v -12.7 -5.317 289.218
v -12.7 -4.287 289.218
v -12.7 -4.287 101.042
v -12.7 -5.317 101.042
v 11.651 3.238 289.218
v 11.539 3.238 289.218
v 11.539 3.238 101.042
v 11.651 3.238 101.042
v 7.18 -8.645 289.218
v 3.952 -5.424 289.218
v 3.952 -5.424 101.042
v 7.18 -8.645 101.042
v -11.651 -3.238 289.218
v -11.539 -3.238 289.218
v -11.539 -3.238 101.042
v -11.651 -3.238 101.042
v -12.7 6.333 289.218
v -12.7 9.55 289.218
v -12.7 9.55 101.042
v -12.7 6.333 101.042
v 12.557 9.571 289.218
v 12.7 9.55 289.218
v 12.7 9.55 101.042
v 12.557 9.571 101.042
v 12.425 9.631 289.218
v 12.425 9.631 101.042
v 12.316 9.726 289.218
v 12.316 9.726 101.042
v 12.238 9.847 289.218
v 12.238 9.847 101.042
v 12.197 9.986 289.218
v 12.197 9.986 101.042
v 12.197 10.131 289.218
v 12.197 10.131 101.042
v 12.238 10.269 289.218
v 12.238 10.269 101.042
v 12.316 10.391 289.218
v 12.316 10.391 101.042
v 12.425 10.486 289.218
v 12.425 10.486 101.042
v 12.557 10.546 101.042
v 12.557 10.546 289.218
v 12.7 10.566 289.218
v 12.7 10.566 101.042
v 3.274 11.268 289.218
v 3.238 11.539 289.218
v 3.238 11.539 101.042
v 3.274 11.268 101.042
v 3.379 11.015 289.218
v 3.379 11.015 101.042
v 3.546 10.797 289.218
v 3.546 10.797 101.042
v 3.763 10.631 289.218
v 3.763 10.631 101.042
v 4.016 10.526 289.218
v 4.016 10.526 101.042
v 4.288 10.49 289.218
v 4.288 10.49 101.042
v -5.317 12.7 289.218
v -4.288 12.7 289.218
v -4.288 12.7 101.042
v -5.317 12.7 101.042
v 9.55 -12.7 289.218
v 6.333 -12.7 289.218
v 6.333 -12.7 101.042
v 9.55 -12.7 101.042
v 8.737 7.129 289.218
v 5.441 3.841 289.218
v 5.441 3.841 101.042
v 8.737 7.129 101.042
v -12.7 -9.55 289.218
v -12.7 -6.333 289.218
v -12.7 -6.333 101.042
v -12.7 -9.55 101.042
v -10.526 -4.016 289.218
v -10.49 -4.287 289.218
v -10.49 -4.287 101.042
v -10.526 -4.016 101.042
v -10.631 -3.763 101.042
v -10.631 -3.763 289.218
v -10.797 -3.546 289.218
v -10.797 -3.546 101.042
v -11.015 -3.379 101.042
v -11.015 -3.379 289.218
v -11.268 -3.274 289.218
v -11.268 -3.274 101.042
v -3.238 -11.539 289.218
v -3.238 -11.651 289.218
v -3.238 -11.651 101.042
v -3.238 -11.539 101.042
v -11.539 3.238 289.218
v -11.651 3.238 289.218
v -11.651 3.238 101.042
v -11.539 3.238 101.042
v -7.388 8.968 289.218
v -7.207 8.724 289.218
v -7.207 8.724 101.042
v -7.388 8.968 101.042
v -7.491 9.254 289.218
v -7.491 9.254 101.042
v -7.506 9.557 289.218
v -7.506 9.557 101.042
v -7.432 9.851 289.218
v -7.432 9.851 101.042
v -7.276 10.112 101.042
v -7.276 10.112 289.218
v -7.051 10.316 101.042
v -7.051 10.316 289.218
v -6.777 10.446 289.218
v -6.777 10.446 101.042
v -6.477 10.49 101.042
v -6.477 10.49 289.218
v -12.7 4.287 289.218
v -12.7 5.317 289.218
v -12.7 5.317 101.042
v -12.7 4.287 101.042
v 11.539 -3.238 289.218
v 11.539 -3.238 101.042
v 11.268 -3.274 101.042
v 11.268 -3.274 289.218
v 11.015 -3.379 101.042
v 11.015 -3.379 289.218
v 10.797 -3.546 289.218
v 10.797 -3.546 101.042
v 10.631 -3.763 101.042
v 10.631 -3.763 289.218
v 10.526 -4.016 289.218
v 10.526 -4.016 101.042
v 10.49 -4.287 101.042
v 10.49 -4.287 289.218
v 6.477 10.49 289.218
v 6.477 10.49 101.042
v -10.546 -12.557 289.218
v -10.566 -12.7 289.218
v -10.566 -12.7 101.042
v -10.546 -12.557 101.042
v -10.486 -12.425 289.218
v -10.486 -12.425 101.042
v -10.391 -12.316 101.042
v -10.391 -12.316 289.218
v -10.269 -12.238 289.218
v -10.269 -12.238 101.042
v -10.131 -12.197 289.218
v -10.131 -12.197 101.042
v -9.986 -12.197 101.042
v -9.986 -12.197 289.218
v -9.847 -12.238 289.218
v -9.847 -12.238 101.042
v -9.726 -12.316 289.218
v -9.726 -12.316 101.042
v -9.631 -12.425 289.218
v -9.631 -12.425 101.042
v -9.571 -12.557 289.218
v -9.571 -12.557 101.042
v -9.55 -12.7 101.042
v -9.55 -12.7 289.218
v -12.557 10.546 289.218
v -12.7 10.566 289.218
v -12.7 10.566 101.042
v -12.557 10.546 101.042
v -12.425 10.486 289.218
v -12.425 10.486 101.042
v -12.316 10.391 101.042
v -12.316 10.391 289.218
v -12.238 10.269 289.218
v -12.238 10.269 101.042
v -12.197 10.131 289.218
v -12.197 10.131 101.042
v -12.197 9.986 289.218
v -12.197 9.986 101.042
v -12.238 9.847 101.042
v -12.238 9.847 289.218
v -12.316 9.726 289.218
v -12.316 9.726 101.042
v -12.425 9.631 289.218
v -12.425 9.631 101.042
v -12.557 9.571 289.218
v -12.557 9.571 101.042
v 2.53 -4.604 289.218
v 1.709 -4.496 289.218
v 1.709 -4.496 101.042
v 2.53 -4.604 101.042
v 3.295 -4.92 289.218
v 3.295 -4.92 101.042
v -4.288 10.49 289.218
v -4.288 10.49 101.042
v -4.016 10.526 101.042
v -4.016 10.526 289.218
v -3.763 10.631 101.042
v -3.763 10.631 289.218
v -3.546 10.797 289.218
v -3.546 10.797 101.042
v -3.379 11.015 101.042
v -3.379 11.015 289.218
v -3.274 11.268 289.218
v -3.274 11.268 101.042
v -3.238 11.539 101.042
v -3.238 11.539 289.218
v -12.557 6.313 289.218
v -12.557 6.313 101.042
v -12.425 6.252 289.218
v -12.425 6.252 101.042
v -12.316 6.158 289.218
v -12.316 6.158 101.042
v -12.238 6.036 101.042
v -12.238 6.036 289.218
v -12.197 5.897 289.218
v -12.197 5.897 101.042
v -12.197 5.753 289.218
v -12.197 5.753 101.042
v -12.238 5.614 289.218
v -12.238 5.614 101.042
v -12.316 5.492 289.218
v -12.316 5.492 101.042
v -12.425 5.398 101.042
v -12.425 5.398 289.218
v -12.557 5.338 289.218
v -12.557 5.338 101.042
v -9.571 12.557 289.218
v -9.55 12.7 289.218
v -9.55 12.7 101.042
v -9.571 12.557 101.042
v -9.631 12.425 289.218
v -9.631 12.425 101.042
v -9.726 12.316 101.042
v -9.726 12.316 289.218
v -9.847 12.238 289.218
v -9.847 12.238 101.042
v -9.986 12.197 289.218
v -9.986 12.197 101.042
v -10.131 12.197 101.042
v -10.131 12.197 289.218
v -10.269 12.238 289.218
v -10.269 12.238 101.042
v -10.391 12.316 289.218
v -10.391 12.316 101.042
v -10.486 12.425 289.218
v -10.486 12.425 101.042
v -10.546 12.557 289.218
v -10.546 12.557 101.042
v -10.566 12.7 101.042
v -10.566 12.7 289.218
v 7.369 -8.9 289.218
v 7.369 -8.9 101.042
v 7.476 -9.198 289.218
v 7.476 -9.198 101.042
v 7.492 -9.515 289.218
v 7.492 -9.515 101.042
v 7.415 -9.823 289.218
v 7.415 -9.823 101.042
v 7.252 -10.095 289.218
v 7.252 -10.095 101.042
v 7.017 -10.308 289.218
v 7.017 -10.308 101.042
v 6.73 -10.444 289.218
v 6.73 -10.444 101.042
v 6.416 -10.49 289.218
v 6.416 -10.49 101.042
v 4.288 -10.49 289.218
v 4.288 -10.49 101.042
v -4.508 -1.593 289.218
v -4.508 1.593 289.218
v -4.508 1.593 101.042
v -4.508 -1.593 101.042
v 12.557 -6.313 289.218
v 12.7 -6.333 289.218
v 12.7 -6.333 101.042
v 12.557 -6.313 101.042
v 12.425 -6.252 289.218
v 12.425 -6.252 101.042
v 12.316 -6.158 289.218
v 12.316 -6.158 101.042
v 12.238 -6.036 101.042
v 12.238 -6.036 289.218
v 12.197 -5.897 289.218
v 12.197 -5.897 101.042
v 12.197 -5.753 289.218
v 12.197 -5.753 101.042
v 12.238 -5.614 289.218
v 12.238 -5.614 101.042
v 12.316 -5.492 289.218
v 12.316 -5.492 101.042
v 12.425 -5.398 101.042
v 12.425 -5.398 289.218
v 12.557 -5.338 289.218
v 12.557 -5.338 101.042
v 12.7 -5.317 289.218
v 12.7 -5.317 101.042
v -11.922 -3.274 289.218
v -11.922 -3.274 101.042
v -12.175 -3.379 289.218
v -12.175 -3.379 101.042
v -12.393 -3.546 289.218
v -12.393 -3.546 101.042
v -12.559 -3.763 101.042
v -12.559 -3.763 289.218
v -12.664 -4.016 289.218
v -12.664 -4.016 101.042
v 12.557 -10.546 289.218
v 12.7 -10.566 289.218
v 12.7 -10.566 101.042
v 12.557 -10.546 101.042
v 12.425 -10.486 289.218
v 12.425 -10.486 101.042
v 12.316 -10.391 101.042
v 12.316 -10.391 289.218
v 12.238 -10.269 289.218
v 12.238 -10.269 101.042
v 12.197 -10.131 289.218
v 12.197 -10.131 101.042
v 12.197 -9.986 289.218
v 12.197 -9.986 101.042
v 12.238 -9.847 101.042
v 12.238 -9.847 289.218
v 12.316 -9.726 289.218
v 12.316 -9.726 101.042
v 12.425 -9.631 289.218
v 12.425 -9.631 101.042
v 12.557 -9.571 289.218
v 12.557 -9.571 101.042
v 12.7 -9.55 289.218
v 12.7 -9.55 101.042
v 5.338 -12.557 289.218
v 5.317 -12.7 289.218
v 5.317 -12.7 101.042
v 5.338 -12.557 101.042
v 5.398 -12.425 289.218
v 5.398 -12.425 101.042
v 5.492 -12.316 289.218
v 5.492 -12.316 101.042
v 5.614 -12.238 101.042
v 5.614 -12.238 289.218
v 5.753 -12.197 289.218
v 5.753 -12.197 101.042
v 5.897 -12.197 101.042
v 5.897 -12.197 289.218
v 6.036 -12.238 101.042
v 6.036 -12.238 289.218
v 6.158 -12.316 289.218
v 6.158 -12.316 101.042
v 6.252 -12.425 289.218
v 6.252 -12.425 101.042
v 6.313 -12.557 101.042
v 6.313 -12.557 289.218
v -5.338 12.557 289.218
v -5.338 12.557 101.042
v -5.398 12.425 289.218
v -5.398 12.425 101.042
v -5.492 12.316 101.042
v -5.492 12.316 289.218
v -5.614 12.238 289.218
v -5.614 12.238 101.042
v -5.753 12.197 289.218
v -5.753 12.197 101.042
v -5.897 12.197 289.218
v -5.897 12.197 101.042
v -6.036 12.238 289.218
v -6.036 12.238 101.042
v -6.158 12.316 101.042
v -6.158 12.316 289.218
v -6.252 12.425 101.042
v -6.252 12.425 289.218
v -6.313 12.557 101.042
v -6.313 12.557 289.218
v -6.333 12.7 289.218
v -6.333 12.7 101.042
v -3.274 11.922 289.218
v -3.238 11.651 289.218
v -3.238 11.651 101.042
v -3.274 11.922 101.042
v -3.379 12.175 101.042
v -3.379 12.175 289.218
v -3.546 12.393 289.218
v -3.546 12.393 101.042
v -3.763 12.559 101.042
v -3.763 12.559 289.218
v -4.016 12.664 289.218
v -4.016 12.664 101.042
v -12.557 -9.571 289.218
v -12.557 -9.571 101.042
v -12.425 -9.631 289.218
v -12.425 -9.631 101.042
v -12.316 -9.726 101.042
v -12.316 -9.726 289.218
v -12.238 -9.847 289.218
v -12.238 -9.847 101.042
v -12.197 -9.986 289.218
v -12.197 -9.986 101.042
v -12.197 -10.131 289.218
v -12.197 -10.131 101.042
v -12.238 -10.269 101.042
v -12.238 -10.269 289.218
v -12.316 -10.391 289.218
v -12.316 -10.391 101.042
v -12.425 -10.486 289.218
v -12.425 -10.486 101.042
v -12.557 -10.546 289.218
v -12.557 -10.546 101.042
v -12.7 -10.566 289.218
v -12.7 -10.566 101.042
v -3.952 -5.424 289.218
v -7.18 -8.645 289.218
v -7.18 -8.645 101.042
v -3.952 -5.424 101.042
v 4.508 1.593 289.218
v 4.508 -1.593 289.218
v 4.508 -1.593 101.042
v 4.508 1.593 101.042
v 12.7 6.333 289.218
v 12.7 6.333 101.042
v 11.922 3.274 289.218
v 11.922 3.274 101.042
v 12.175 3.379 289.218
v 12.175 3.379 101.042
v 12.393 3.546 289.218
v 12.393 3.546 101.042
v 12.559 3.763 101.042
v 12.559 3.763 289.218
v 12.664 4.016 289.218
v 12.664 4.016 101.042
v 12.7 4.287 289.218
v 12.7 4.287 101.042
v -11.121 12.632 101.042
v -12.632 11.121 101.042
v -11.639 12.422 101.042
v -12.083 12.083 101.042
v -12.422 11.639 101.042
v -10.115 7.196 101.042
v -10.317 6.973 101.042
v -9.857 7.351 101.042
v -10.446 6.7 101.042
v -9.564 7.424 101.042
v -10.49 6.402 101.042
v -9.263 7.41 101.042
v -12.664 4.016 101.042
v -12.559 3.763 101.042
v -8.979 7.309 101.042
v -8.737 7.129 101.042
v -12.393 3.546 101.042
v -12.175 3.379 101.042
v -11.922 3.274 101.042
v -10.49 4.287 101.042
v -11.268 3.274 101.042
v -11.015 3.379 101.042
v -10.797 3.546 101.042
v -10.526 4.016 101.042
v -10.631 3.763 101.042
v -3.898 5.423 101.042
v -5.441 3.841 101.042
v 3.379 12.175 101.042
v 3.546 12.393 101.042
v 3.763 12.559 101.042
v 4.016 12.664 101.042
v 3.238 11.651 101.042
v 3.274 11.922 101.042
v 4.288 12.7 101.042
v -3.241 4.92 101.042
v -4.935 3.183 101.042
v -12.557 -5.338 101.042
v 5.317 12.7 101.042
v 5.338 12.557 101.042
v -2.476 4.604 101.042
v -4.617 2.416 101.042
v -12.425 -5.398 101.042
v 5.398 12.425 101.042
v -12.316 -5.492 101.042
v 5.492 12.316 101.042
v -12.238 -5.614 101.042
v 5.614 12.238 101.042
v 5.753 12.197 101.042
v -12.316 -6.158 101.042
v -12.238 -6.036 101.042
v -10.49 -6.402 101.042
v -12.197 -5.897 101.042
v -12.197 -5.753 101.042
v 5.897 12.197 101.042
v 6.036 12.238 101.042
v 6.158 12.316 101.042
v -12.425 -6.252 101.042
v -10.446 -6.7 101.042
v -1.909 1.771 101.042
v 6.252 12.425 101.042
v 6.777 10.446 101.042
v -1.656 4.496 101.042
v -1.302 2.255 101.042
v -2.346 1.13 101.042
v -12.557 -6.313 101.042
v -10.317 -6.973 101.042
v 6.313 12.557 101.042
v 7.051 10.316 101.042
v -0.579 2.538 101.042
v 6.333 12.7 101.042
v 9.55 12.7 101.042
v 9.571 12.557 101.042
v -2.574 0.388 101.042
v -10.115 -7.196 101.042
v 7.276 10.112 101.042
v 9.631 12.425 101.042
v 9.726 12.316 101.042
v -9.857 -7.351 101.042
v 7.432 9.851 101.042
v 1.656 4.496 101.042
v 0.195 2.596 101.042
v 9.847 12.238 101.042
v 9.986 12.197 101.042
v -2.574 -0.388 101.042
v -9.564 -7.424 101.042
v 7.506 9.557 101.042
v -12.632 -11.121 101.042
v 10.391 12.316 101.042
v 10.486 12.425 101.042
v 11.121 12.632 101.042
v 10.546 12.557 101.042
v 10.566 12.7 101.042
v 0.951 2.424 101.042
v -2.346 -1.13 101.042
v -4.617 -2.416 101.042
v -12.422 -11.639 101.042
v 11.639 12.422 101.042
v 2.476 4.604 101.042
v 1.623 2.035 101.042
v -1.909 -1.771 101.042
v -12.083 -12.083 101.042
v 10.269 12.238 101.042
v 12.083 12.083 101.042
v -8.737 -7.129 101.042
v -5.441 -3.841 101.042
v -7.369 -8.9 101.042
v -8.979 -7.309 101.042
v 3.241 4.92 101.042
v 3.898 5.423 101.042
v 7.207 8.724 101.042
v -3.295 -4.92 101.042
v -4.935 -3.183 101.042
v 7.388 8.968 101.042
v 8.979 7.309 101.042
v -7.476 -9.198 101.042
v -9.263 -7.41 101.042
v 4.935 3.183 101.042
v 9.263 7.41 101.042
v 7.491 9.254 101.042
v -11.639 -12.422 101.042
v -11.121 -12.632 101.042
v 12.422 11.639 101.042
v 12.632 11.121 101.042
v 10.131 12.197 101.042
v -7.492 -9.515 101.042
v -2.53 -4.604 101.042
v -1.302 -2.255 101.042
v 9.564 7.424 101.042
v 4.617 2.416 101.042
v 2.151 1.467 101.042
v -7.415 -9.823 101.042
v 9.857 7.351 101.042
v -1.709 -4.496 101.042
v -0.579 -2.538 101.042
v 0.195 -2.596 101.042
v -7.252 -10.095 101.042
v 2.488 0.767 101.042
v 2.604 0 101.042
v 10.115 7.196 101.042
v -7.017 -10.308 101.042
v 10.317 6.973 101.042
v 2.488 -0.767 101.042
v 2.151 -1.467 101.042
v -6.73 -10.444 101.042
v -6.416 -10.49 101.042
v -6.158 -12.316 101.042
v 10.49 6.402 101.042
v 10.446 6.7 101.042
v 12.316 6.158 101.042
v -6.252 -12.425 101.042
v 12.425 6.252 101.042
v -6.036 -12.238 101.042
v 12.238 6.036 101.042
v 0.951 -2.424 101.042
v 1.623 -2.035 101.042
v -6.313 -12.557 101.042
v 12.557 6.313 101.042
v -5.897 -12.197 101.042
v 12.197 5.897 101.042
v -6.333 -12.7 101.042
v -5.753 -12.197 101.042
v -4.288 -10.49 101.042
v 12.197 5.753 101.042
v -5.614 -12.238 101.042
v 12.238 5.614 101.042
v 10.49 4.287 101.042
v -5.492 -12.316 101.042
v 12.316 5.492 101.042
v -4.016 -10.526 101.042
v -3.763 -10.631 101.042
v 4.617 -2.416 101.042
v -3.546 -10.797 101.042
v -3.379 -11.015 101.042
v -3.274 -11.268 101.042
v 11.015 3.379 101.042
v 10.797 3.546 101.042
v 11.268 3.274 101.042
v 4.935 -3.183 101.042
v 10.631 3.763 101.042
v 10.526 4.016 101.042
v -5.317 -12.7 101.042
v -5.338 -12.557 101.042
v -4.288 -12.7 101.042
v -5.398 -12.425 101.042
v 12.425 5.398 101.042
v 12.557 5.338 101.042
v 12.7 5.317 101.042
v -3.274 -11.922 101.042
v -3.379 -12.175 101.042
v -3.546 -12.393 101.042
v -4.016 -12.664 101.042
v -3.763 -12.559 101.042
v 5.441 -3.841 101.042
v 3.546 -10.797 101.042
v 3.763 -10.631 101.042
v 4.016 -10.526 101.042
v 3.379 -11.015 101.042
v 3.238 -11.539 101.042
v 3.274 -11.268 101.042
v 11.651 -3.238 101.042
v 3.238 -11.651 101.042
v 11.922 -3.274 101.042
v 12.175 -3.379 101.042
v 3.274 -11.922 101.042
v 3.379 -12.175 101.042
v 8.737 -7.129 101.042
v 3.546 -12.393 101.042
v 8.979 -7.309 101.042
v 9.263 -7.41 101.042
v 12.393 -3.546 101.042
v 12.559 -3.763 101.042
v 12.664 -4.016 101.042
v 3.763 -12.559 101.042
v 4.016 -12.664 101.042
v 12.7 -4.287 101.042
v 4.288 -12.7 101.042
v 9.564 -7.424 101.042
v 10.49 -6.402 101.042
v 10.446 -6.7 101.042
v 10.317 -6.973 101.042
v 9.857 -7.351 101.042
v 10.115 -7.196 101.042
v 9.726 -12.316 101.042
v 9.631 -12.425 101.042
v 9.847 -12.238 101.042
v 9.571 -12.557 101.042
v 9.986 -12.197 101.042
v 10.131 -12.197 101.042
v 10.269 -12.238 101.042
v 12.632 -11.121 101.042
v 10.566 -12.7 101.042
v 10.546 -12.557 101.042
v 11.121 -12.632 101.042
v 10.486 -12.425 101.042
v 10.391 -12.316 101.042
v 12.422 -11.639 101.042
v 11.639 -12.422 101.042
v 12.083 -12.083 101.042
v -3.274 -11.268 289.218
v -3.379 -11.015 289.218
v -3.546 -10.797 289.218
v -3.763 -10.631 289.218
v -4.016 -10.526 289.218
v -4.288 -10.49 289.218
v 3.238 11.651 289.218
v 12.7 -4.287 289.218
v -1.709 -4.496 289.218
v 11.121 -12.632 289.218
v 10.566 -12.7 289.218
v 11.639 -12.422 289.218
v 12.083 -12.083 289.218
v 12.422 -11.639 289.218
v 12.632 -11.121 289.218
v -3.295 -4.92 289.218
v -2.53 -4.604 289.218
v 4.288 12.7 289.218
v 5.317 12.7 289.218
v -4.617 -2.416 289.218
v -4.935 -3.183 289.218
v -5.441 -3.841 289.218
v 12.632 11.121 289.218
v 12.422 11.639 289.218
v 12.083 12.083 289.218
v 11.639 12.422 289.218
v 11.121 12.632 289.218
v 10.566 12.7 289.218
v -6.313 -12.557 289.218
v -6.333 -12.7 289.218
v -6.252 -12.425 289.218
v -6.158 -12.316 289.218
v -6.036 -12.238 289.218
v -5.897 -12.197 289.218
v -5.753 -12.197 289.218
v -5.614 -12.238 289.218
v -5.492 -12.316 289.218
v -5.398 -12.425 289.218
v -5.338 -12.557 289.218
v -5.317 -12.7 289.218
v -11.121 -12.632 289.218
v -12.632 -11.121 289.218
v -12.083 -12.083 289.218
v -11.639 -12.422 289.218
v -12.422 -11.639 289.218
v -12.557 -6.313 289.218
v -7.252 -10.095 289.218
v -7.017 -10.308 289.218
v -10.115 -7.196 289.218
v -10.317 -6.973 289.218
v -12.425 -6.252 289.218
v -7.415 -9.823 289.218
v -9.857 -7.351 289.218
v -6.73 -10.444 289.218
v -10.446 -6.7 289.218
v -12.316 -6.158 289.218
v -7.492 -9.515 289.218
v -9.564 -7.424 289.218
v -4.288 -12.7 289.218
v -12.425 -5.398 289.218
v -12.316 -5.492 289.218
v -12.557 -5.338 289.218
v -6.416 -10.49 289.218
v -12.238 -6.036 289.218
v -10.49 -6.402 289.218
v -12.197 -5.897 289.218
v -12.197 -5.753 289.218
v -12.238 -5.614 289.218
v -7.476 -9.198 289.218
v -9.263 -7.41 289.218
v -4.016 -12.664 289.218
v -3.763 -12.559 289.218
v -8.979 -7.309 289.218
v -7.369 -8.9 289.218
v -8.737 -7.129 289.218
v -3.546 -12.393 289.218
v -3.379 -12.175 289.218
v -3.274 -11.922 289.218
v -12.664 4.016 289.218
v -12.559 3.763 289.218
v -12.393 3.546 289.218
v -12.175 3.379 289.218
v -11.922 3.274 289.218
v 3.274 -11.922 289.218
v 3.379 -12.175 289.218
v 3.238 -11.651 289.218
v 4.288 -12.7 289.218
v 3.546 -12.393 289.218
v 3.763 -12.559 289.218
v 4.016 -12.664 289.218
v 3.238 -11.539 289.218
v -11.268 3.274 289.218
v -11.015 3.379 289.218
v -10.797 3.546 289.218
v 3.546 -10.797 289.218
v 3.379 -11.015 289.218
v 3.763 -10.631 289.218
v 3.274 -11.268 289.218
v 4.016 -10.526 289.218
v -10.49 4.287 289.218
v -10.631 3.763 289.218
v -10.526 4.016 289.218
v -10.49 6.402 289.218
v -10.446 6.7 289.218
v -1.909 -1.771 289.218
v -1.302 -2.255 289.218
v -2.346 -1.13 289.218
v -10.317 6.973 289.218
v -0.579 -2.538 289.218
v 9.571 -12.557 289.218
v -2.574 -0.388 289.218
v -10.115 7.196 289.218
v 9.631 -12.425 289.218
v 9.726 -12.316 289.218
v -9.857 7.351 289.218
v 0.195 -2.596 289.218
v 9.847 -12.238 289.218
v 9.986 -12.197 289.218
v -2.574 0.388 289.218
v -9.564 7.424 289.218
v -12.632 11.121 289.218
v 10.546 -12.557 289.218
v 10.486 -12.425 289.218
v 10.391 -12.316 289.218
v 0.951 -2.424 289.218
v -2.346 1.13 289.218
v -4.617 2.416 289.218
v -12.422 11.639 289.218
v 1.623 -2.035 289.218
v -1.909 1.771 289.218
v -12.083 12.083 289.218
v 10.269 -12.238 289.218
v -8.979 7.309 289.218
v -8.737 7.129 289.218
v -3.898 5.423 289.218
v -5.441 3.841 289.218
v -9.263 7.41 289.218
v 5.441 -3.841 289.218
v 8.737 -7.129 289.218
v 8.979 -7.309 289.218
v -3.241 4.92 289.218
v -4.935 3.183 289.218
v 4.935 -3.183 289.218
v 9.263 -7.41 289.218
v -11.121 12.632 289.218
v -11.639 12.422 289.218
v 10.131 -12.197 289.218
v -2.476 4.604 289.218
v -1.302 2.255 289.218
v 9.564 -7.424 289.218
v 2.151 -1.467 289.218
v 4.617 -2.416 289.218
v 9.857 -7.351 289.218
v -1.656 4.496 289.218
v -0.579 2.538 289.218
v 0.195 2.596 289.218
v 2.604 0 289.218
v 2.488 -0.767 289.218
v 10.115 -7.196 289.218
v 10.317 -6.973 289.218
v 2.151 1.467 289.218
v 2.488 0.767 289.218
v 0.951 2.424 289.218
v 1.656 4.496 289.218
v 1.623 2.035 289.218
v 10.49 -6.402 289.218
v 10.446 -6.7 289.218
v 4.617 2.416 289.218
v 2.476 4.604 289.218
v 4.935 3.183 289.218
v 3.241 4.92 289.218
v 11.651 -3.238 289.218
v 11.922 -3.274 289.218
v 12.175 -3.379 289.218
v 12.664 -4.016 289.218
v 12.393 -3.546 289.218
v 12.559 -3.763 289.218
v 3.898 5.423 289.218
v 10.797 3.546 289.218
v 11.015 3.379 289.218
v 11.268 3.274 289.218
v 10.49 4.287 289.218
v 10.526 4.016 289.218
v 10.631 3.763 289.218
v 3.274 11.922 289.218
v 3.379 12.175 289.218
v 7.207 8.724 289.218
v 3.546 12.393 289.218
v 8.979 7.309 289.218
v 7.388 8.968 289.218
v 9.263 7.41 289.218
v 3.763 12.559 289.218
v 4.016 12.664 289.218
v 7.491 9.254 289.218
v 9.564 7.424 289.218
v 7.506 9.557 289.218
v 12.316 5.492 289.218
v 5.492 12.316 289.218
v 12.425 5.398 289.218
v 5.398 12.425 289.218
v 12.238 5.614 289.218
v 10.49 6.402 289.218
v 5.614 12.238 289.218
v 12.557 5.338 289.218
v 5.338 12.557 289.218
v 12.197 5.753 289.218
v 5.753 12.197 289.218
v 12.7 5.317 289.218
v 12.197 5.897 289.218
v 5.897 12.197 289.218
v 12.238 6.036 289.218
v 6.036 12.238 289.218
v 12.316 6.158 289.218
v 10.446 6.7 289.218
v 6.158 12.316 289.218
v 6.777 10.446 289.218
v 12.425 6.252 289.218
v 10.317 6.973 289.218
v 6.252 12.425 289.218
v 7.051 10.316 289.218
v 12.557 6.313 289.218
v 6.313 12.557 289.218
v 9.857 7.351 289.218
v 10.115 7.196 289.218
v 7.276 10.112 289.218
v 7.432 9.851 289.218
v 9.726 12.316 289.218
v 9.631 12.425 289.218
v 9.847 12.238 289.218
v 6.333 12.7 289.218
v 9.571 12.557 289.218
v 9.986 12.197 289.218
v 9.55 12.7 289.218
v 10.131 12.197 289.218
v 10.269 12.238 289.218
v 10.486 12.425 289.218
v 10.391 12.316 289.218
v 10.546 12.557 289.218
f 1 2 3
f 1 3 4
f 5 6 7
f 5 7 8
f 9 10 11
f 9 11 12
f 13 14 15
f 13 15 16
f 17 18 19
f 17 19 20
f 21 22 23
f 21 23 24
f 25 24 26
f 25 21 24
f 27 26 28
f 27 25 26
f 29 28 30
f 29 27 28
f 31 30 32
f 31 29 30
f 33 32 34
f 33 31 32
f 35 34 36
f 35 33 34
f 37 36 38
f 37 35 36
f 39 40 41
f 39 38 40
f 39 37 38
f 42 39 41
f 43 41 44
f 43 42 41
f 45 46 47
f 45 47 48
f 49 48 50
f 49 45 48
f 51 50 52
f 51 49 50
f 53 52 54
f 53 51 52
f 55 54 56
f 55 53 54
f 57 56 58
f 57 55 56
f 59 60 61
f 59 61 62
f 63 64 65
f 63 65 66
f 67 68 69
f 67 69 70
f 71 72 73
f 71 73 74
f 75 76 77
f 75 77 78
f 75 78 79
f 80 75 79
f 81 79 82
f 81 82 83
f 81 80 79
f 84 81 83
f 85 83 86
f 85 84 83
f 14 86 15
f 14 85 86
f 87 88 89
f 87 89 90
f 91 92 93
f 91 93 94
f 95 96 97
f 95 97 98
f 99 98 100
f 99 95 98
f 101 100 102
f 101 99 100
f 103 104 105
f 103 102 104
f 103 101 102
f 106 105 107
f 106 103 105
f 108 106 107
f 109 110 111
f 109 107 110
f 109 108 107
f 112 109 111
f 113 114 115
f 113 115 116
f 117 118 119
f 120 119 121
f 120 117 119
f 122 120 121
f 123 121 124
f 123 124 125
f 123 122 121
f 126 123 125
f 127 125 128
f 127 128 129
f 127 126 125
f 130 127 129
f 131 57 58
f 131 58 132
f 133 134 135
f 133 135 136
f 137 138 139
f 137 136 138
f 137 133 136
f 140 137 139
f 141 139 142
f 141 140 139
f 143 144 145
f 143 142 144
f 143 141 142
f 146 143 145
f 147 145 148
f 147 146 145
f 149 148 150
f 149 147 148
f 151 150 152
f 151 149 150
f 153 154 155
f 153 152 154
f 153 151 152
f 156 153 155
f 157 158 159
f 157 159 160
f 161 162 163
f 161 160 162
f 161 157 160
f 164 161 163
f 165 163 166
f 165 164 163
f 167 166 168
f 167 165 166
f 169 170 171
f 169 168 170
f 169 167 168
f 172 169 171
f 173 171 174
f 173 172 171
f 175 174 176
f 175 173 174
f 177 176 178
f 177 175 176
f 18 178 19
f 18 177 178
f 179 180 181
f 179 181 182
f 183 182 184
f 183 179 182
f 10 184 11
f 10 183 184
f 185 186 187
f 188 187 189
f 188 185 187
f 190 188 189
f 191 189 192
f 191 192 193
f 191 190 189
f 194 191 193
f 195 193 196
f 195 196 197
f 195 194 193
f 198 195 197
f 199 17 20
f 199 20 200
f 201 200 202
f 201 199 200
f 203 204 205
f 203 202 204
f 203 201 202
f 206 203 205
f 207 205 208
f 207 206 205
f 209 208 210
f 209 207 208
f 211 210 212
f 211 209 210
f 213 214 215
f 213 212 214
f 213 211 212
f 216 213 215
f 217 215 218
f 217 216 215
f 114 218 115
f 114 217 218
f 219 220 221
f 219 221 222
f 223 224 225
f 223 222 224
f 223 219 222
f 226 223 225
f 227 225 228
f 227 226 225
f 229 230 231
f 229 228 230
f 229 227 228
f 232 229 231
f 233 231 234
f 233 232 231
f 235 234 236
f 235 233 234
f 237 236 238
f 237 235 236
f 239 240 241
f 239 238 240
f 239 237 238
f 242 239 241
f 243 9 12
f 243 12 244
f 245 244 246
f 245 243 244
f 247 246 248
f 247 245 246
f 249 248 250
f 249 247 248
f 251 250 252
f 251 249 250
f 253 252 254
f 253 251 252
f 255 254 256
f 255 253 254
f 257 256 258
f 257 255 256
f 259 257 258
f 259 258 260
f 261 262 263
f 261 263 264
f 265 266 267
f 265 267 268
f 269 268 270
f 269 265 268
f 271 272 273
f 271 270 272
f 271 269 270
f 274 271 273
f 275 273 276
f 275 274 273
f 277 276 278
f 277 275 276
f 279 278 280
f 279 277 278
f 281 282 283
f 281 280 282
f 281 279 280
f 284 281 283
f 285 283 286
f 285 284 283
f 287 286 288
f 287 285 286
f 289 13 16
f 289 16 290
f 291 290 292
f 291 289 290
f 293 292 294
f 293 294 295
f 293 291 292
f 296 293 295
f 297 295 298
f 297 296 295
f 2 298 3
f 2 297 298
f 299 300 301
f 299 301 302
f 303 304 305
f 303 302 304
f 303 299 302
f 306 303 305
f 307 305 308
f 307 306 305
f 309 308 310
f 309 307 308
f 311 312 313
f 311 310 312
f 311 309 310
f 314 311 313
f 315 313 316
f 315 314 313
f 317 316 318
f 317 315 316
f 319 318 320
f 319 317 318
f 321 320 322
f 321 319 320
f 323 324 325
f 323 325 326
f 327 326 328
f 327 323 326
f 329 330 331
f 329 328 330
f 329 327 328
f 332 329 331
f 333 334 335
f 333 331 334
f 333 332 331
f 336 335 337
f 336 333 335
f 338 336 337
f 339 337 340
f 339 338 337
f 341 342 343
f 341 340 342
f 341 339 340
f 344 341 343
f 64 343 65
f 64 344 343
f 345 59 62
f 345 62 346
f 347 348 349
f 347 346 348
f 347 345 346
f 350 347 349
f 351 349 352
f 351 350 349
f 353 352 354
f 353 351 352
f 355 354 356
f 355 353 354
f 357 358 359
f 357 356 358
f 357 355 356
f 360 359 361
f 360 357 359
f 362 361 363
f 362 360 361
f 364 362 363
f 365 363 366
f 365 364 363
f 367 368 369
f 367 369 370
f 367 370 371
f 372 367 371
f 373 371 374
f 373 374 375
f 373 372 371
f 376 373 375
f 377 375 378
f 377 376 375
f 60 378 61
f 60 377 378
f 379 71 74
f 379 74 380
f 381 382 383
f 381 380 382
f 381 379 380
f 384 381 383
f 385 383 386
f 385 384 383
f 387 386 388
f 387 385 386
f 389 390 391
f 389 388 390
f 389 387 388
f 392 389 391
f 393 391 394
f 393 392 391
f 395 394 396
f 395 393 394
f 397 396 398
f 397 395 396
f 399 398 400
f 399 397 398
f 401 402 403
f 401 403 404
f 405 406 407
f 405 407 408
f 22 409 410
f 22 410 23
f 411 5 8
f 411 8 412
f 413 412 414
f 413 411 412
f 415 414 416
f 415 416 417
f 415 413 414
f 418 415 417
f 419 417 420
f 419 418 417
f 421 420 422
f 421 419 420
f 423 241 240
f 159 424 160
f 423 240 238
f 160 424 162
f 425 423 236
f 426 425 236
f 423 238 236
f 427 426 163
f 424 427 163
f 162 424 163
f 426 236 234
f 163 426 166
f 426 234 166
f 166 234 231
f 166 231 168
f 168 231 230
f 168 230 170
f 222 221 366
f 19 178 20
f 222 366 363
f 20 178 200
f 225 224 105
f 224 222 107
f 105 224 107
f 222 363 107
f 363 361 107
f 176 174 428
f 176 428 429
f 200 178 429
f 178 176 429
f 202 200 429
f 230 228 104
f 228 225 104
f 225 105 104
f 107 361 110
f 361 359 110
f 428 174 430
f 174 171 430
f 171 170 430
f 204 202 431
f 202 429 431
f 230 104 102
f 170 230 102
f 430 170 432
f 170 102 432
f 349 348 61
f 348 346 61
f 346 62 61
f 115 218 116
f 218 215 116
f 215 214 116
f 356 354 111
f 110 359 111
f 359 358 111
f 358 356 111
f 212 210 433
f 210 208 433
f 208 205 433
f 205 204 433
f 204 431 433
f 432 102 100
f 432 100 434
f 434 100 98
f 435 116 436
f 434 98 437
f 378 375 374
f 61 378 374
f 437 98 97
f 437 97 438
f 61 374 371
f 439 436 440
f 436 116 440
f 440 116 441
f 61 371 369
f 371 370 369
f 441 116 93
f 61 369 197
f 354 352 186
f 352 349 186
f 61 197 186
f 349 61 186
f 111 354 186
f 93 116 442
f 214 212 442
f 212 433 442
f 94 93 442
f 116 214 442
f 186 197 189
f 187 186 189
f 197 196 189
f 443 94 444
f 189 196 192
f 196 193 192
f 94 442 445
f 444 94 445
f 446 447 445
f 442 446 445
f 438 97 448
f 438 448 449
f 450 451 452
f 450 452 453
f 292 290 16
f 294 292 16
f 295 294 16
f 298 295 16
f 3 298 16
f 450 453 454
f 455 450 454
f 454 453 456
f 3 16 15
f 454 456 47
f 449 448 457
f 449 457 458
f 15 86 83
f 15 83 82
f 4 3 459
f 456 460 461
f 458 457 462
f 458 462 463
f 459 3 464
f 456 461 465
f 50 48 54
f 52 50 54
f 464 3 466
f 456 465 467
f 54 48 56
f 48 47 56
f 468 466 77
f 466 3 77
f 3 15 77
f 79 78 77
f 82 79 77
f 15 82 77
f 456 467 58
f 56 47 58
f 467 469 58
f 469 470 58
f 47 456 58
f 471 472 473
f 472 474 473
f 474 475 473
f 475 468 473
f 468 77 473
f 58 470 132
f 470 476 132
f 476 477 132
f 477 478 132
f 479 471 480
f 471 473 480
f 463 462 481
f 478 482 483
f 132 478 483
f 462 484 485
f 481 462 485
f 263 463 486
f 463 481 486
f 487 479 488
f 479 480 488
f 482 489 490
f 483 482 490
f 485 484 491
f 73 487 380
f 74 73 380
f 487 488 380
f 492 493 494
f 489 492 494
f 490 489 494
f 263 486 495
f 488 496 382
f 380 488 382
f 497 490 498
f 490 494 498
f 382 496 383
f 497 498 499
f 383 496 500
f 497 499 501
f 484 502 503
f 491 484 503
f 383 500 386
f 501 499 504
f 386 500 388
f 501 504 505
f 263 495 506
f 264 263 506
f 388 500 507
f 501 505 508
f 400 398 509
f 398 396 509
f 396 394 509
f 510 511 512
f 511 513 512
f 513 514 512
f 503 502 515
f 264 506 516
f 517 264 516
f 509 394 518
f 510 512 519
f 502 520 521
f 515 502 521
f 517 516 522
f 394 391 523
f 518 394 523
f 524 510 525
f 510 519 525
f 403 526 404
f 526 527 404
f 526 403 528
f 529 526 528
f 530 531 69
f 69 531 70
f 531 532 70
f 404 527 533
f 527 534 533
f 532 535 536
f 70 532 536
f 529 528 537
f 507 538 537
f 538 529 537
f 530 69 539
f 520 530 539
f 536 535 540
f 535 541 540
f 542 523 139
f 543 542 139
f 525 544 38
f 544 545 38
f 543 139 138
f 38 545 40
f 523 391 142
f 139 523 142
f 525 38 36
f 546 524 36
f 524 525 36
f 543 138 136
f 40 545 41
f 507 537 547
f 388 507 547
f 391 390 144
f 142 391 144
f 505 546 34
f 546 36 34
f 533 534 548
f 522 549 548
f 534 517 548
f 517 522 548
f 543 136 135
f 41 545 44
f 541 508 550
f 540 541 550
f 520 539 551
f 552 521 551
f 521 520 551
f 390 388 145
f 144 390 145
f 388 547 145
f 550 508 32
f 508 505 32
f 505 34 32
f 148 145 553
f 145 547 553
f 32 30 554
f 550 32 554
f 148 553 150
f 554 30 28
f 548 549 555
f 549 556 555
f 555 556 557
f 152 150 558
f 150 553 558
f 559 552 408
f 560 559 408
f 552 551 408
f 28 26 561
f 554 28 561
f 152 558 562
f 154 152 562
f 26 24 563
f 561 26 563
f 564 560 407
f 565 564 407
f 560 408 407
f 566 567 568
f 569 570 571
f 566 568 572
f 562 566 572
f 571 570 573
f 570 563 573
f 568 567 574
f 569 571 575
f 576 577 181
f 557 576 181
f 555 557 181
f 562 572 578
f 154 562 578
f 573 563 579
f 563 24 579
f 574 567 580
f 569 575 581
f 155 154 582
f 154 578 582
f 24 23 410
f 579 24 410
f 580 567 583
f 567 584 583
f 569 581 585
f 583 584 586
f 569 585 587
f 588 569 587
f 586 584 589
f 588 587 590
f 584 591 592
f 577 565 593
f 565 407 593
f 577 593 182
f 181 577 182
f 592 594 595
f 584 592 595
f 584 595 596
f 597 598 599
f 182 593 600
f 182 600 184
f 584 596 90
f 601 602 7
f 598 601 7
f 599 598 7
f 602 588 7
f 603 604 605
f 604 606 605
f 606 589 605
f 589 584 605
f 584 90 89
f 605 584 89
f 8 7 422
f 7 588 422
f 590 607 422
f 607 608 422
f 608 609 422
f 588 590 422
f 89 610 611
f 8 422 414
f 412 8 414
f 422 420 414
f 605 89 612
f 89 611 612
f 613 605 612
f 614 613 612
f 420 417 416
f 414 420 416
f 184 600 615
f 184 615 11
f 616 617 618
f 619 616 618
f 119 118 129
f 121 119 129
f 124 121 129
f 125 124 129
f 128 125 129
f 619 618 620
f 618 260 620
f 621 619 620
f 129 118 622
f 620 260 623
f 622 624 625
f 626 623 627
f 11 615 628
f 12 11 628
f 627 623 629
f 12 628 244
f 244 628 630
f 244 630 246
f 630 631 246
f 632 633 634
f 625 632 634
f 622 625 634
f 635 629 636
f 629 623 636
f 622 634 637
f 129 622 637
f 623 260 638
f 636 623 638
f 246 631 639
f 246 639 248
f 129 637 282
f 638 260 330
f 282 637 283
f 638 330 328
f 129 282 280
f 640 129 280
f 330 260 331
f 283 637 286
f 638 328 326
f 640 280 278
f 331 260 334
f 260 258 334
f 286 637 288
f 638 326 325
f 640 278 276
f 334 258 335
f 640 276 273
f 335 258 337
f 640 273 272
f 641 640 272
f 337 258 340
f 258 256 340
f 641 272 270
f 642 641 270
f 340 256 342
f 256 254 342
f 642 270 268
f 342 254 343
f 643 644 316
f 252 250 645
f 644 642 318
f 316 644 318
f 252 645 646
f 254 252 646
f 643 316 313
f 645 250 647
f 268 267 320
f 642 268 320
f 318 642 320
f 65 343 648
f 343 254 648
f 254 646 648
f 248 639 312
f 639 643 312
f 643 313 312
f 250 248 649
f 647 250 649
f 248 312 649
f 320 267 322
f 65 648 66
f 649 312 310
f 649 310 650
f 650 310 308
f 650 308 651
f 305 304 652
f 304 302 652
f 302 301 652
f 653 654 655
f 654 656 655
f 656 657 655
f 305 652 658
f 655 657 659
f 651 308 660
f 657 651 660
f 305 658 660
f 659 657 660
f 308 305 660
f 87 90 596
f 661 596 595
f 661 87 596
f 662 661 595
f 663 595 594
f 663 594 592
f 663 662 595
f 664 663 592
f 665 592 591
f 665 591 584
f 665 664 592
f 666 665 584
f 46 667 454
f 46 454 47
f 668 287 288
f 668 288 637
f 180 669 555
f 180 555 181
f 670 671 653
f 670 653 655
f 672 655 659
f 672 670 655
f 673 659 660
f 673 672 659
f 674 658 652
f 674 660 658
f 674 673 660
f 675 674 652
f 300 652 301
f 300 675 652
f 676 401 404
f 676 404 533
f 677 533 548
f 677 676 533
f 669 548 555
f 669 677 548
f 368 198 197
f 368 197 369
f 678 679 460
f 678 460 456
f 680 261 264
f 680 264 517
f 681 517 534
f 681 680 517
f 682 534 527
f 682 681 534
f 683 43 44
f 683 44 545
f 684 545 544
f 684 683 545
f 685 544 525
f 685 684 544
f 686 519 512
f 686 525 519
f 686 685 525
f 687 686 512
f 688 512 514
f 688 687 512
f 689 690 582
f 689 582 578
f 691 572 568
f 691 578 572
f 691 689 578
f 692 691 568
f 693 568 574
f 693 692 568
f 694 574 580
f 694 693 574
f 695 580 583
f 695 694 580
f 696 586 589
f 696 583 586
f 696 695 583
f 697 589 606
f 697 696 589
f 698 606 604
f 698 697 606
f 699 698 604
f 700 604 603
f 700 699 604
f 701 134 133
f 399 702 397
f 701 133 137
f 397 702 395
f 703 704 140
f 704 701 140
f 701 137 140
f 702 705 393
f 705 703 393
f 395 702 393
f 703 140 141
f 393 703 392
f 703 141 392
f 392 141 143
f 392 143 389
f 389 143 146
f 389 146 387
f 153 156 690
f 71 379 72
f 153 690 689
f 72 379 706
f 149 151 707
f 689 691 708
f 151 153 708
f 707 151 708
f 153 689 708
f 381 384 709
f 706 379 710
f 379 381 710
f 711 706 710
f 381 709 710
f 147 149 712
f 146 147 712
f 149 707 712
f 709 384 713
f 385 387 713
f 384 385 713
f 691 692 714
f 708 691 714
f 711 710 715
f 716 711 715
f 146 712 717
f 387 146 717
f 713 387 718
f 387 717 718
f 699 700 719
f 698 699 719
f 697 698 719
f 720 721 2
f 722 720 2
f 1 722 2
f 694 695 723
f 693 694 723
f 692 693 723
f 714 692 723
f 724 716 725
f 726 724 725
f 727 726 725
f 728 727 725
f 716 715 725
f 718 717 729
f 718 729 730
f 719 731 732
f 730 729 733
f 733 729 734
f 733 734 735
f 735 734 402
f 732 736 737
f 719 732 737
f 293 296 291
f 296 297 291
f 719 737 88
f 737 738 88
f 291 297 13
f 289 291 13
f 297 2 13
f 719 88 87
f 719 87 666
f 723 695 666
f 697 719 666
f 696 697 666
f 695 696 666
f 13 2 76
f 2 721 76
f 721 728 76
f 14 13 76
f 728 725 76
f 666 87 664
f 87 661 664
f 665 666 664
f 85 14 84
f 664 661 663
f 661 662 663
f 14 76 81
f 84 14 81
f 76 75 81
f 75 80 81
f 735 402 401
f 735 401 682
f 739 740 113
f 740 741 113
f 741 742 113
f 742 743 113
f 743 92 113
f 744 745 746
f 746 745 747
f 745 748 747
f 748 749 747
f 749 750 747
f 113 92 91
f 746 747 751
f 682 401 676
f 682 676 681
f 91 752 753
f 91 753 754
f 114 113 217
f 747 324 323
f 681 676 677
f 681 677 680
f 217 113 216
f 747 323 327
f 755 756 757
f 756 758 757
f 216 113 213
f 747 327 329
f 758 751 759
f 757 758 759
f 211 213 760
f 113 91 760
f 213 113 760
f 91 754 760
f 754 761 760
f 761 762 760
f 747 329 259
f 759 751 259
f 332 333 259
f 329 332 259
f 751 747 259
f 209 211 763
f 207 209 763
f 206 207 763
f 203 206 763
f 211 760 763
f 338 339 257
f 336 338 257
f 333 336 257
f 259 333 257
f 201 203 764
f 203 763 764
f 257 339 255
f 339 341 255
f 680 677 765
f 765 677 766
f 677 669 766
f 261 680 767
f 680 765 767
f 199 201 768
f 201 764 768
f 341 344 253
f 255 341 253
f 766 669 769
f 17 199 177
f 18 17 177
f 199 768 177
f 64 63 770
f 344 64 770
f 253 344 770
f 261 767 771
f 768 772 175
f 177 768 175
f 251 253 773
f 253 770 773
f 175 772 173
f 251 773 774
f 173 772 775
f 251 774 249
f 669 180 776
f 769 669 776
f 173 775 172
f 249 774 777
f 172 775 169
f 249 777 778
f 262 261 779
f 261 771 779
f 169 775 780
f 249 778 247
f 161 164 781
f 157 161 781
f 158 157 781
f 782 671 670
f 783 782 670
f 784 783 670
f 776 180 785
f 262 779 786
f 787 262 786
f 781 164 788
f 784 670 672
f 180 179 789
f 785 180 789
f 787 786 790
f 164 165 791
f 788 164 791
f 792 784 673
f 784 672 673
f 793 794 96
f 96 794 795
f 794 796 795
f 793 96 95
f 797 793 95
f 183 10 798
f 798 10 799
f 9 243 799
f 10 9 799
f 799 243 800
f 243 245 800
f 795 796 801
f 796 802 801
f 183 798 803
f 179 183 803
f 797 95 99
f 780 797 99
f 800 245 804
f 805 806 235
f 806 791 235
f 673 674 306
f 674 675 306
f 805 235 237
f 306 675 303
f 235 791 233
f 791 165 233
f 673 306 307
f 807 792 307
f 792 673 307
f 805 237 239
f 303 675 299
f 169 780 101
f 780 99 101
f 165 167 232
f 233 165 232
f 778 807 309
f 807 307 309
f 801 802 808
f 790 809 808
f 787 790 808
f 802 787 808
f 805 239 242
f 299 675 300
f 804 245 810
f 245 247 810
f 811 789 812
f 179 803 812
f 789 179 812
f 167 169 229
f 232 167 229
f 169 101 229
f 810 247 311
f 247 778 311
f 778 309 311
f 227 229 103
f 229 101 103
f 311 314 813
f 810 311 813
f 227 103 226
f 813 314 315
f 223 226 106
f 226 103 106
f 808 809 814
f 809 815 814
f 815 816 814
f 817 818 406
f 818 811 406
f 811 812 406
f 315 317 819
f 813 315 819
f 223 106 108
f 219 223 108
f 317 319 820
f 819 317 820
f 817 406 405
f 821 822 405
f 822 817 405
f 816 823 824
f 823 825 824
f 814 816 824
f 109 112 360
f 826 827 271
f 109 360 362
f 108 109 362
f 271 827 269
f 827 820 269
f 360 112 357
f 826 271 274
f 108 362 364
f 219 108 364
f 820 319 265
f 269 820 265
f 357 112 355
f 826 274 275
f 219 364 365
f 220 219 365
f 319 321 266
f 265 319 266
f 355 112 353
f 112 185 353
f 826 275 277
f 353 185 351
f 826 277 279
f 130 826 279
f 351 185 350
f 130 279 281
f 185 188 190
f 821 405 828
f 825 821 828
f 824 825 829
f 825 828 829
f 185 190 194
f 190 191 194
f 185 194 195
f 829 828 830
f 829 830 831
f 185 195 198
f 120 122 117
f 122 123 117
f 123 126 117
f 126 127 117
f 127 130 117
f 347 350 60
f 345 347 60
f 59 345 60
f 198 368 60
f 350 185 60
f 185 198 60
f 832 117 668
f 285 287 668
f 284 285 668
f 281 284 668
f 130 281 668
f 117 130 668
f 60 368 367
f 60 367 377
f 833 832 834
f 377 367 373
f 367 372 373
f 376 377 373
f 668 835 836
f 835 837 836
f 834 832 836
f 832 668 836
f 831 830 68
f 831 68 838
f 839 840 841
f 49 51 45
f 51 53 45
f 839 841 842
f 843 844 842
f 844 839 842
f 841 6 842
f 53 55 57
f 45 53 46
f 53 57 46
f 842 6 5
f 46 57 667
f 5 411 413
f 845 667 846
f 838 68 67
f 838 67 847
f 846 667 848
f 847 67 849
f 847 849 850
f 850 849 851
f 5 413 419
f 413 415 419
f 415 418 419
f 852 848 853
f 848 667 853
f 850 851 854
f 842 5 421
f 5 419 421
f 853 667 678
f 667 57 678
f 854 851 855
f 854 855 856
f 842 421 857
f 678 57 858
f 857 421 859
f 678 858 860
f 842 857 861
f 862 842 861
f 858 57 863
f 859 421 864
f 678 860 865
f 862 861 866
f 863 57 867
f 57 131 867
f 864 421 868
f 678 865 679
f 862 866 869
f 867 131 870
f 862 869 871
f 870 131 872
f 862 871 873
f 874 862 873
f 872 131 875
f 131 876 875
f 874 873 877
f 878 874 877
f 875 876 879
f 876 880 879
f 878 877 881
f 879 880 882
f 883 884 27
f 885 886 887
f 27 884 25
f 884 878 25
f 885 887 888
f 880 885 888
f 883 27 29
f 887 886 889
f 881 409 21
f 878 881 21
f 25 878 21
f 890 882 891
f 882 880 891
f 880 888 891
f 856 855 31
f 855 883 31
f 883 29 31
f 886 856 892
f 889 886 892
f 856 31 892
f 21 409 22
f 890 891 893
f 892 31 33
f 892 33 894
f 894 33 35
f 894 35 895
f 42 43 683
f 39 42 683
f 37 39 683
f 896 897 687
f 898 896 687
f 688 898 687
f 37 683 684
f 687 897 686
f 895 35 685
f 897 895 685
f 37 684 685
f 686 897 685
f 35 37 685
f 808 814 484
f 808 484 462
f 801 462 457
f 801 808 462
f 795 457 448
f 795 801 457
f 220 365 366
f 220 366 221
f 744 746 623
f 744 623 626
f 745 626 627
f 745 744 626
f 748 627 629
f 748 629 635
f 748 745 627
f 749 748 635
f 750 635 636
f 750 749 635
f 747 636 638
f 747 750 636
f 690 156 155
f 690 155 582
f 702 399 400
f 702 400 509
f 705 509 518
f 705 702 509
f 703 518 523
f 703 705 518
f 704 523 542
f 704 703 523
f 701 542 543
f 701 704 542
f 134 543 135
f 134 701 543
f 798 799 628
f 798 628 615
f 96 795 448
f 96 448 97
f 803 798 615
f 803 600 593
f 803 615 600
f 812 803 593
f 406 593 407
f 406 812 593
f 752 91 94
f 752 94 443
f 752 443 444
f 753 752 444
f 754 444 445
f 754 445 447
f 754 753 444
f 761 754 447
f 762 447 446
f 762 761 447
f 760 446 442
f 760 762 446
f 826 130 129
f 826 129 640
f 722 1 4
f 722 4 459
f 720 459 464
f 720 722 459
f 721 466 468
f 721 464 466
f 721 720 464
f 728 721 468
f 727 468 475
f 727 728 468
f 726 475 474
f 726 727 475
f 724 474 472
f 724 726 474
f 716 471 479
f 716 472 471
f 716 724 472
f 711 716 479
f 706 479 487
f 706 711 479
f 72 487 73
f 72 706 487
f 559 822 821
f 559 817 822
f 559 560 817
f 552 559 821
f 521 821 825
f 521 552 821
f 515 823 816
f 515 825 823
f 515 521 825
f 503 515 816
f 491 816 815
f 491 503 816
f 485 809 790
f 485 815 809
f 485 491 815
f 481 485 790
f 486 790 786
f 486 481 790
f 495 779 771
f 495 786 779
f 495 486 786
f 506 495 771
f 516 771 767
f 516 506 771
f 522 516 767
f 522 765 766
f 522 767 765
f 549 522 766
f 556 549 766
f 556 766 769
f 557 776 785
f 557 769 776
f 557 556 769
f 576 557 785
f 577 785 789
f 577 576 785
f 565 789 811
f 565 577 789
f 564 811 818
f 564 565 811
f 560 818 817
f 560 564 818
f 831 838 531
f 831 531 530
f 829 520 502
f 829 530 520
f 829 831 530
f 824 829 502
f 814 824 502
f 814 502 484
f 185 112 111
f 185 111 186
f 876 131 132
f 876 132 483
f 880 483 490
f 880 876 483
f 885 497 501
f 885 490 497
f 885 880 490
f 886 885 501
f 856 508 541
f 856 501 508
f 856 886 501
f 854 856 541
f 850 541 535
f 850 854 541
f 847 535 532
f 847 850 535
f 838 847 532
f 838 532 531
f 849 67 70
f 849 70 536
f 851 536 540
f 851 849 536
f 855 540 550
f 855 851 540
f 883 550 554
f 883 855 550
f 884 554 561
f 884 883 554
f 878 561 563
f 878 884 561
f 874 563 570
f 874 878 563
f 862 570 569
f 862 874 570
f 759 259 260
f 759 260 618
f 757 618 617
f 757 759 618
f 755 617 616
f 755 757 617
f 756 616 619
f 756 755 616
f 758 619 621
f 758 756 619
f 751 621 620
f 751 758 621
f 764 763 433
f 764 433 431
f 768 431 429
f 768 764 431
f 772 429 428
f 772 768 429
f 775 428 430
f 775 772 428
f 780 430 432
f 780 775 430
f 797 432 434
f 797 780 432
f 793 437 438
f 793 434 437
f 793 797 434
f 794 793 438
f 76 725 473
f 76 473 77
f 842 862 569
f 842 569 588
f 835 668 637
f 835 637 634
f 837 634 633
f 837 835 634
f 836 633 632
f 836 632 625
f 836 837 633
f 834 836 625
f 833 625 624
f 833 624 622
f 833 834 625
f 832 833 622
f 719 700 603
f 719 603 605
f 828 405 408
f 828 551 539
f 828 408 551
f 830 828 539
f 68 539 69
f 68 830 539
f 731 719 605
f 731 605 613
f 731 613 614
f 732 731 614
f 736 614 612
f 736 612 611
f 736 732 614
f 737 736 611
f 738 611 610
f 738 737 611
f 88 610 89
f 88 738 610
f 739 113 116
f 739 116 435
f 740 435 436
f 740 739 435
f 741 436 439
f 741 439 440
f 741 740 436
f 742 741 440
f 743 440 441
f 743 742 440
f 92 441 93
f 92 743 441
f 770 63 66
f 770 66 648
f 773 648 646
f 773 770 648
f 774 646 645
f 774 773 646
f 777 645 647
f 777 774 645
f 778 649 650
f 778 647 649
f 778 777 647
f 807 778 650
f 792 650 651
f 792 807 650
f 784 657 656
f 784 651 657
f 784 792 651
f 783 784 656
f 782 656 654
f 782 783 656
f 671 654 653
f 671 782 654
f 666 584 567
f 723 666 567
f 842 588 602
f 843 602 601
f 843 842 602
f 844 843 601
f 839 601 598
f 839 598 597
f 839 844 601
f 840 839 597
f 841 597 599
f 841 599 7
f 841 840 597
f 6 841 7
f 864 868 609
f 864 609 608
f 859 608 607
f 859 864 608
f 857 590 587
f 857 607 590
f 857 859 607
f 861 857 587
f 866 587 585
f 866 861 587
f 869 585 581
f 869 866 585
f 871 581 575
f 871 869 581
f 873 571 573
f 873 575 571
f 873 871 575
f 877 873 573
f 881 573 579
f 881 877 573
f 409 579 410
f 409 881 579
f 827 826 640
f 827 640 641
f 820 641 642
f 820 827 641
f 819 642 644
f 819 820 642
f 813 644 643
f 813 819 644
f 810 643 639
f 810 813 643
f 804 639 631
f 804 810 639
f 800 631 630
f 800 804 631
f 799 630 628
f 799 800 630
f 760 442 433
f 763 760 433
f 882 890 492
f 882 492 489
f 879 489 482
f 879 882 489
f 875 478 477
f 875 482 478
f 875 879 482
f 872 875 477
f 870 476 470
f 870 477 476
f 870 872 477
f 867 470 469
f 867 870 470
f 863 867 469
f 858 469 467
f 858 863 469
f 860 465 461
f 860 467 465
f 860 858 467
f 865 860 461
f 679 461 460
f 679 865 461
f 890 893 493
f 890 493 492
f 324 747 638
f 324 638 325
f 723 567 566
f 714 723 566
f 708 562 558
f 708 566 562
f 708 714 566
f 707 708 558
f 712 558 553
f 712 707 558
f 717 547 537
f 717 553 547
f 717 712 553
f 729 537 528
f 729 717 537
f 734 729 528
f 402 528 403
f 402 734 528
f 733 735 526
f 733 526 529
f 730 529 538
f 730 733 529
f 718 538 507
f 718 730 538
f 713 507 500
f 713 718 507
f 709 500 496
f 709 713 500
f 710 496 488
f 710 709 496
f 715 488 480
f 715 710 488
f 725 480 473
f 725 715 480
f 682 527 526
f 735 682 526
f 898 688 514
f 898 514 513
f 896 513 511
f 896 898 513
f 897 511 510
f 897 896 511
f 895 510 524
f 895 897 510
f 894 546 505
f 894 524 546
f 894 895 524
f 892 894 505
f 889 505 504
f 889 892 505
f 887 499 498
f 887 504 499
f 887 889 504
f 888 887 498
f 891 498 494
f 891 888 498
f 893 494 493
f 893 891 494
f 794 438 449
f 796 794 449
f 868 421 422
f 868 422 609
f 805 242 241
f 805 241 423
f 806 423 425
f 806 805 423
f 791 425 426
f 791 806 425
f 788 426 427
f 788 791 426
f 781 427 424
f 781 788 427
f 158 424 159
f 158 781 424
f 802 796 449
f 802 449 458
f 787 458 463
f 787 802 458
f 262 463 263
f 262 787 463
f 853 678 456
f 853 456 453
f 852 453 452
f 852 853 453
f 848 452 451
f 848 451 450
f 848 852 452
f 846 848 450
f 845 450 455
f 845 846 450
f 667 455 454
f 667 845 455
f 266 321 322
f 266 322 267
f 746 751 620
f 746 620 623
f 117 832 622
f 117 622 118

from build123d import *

# Parameters (mm, degrees)
SKETCH1_R               = 2.6035
BOSS_EXTRUDE1_DEPTH     = 304.8
SKETCH2_W               = 16.257599062
SKETCH2_H               = 27.586789262
CUT_EXTRUDE1_DEPTH      = 1.778
CUT_EXTRUDE1_DEPTH_BACK = 26.162


with BuildPart() as part:
    # Sketch1 → Boss-Extrude1 (new body, symmetric)
    with BuildSketch(Plane.XY):
        with BuildLine():
            Line((-7.179650497, -8.645192506), (-3.952270251, -5.423690499))
            ThreePointArc((-3.952270251, -5.423690499), (-2.922936451, -4.736929036), (-1.709253557, -4.4958))
            Line((-1.709253557, -4.4958), (1.709253557, -4.4958))
            ThreePointArc((1.709253557, -4.4958), (2.922936451, -4.736929036), (3.952270251, -5.423690499))
            Line((3.952270251, -5.423690499), (7.179650497, -8.645192506))
            ThreePointArc((7.179650497, -8.645192506), (7.41473083, -9.822813117), (6.416408329, -10.4902))
            Line((6.416408329, -10.4902), (4.287512407, -10.4902))
            ThreePointArc((4.287512407, -10.4902), (3.54574862, -10.79744862), (3.2385, -11.539212407))
            Line((3.2385, -11.539212407), (3.2385, -11.650987593))
            ThreePointArc((3.2385, -11.650987593), (3.54574862, -12.39275138), (4.287512407, -12.7))
            Line((4.287512407, -12.7), (5.317126718, -12.7))
            ThreePointArc((5.317126718, -12.7), (5.825126718, -12.192), (6.333126718, -12.7))
            Line((6.333126718, -12.7), (9.550443118, -12.7))
            ThreePointArc((9.550443118, -12.7), (10.058366869, -12.192000006), (10.566443095, -12.699847501))
            ThreePointArc((10.566443095, -12.699847501), (12.082537762, -12.08250727), (12.699846982, -10.566399977))
            ThreePointArc((12.699846982, -10.566399977), (12.192000006, -10.058323491), (12.7, -9.5504))
            Line((12.7, -9.5504), (12.7, -6.3330836))
            ThreePointArc((12.7, -6.3330836), (12.192, -5.8250836), (12.7, -5.3170836))
            Line((12.7, -5.3170836), (12.7, -4.287469289))
            ThreePointArc((12.7, -4.287469289), (12.39275138, -3.545705502), (11.650987593, -3.238456882))
            Line((11.650987593, -3.238456882), (11.539212407, -3.238456882))
            ThreePointArc((11.539212407, -3.238456882), (10.79744862, -3.545705502), (10.4902, -4.287469289))
            Line((10.4902, -4.287469289), (10.4902, -6.402089023))
            ThreePointArc((10.4902, -6.402089023), (9.856505071, -7.351067942), (8.737131347, -7.129408934))
            Line((8.737131347, -7.129408934), (5.441005833, -3.840816462))
            ThreePointArc((5.441005833, -3.840816462), (4.750877967, -2.809883091), (4.5085, -1.593185507))
            Line((4.5085, -1.593185507), (4.5085, 1.593185507))
            ThreePointArc((4.5085, 1.593185507), (4.750877967, 2.809883091), (5.441005833, 3.840816462))
            Line((5.441005833, 3.840816462), (8.737131347, 7.129408934))
            ThreePointArc((8.737131347, 7.129408934), (9.856505071, 7.351067942), (10.4902, 6.402089023))
            Line((10.4902, 6.402089023), (10.4902, 4.287469289))
            ThreePointArc((10.4902, 4.287469289), (10.79744862, 3.545705502), (11.539212407, 3.238456882))
            Line((11.539212407, 3.238456882), (11.650987593, 3.238456882))
            ThreePointArc((11.650987593, 3.238456882), (12.39275138, 3.545705502), (12.7, 4.287469289))
            Line((12.7, 4.287469289), (12.7, 5.3170836))
            ThreePointArc((12.7, 5.3170836), (12.192, 5.8250836), (12.7, 6.3330836))
            Line((12.7, 6.3330836), (12.7, 9.5504))
            ThreePointArc((12.7, 9.5504), (12.192000006, 10.058323491), (12.699846982, 10.566399977))
            ThreePointArc((12.699846982, 10.566399977), (12.082537762, 12.08250727), (10.566443095, 12.699847501))
            ThreePointArc((10.566443095, 12.699847501), (10.058366869, 12.192000006), (9.550443118, 12.7))
            Line((9.550443118, 12.7), (6.333126718, 12.7))
            ThreePointArc((6.333126718, 12.7), (5.825126718, 12.192), (5.317126718, 12.7))
            Line((5.317126718, 12.7), (4.287512407, 12.7))
            ThreePointArc((4.287512407, 12.7), (3.54574862, 12.39275138), (3.2385, 11.650987593))
            Line((3.2385, 11.650987593), (3.2385, 11.539212407))
            ThreePointArc((3.2385, 11.539212407), (3.54574862, 10.79744862), (4.287512407, 10.4902))
            Line((4.287512407, 10.4902), (6.476788598, 10.4902))
            ThreePointArc((6.476788598, 10.4902), (7.432222385, 9.85140422), (7.207036008, 8.724370562))
            Line((7.207036008, 8.724370562), (3.898272566, 5.423169045))
            ThreePointArc((3.898272566, 5.423169045), (2.869120213, 4.736787962), (1.655778399, 4.4958))
            Line((1.655778399, 4.4958), (-1.655778399, 4.4958))
            ThreePointArc((-1.655778399, 4.4958), (-2.869120213, 4.736787962), (-3.898272566, 5.423169045))
            Line((-3.898272566, 5.423169045), (-7.207036008, 8.724370562))
            ThreePointArc((-7.207036008, 8.724370562), (-7.432222385, 9.85140422), (-6.476788598, 10.4902))
            Line((-6.476788598, 10.4902), (-4.287512407, 10.4902))
            ThreePointArc((-4.287512407, 10.4902), (-3.54574862, 10.79744862), (-3.2385, 11.539212407))
            Line((-3.2385, 11.539212407), (-3.2385, 11.650987593))
            ThreePointArc((-3.2385, 11.650987593), (-3.54574862, 12.39275138), (-4.287512407, 12.7))
            Line((-4.287512407, 12.7), (-5.317126718, 12.7))
            ThreePointArc((-5.317126718, 12.7), (-5.825126718, 12.192), (-6.333126718, 12.7))
            Line((-6.333126718, 12.7), (-9.550443118, 12.7))
            ThreePointArc((-9.550443118, 12.7), (-10.058366869, 12.192000006), (-10.566443095, 12.699847501))
            ThreePointArc((-10.566443095, 12.699847501), (-12.082537762, 12.08250727), (-12.699846982, 10.566399977))
            ThreePointArc((-12.699846982, 10.566399977), (-12.192000006, 10.058323491), (-12.7, 9.5504))
            Line((-12.7, 9.5504), (-12.7, 6.3330836))
            ThreePointArc((-12.7, 6.3330836), (-12.192, 5.8250836), (-12.7, 5.3170836))
            Line((-12.7, 5.3170836), (-12.7, 4.287469289))
            ThreePointArc((-12.7, 4.287469289), (-12.39275138, 3.545705502), (-11.650987593, 3.238456882))
            Line((-11.650987593, 3.238456882), (-11.539212407, 3.238456882))
            ThreePointArc((-11.539212407, 3.238456882), (-10.79744862, 3.545705502), (-10.4902, 4.287469289))
            Line((-10.4902, 4.287469289), (-10.4902, 6.402089023))
            ThreePointArc((-10.4902, 6.402089023), (-9.856505071, 7.351067942), (-8.737131347, 7.129408934))
            Line((-8.737131347, 7.129408934), (-5.441005833, 3.840816462))
            ThreePointArc((-5.441005833, 3.840816462), (-4.750877967, 2.809883091), (-4.5085, 1.593185507))
            Line((-4.5085, 1.593185507), (-4.5085, -1.593185507))
            ThreePointArc((-4.5085, -1.593185507), (-4.750877967, -2.809883091), (-5.441005833, -3.840816462))
            Line((-5.441005833, -3.840816462), (-8.737131347, -7.129408934))
            ThreePointArc((-8.737131347, -7.129408934), (-9.856505071, -7.351067942), (-10.4902, -6.402089023))
            Line((-10.4902, -6.402089023), (-10.4902, -4.287469289))
            ThreePointArc((-10.4902, -4.287469289), (-10.79744862, -3.545705502), (-11.539212407, -3.238456882))
            Line((-11.539212407, -3.238456882), (-11.650987593, -3.238456882))
            ThreePointArc((-11.650987593, -3.238456882), (-12.39275138, -3.545705502), (-12.7, -4.287469289))
            Line((-12.7, -4.287469289), (-12.7, -5.3170836))
            ThreePointArc((-12.7, -5.3170836), (-12.192, -5.8250836), (-12.7, -6.3330836))
            Line((-12.7, -6.3330836), (-12.7, -9.5504))
            ThreePointArc((-12.7, -9.5504), (-12.192000006, -10.058323491), (-12.699846982, -10.566399977))
            ThreePointArc((-12.699846982, -10.566399977), (-12.082537762, -12.08250727), (-10.566443095, -12.699847501))
            ThreePointArc((-10.566443095, -12.699847501), (-10.058366869, -12.192000006), (-9.550443118, -12.7))
            Line((-9.550443118, -12.7), (-6.333126718, -12.7))
            ThreePointArc((-6.333126718, -12.7), (-5.825126718, -12.192), (-5.317126718, -12.7))
            Line((-5.317126718, -12.7), (-4.287512407, -12.7))
            ThreePointArc((-4.287512407, -12.7), (-3.54574862, -12.39275138), (-3.2385, -11.650987593))
            Line((-3.2385, -11.650987593), (-3.2385, -11.539212407))
            ThreePointArc((-3.2385, -11.539212407), (-3.54574862, -10.79744862), (-4.287512407, -10.4902))
            Line((-4.287512407, -10.4902), (-6.416408329, -10.4902))
            ThreePointArc((-6.416408329, -10.4902), (-7.41473083, -9.822813117), (-7.179650497, -8.645192506))
        make_face()
        Circle(SKETCH1_R, mode=Mode.SUBTRACT)
    extrude(amount=BOSS_EXTRUDE1_DEPTH, both=True)

    # Sketch2 → Cut-Extrude1 (cut, two sides)
    with BuildSketch(Plane(origin=(12.7, 0, 0), x_dir=(0, 0, -1), z_dir=(1, 0, 0))) as cut_extrude1_sk:
        Polygon((-56.586481007, -14.234528627), (310.743066166, -14.234528627), (310.743066166, 13.643777343), (-56.586481007, 13.643777343), (-101.042247833, 13.643777343), (-101.042247833, -14.234528627), align=None)
        with Locations((-297.347005301, -0.441133996)):
            Rectangle(SKETCH2_W, SKETCH2_H)
    extrude(amount=CUT_EXTRUDE1_DEPTH, mode=Mode.SUBTRACT)
    extrude(cut_extrude1_sk.sketch, amount=-CUT_EXTRUDE1_DEPTH_BACK, mode=Mode.SUBTRACT)


solid = part.part
